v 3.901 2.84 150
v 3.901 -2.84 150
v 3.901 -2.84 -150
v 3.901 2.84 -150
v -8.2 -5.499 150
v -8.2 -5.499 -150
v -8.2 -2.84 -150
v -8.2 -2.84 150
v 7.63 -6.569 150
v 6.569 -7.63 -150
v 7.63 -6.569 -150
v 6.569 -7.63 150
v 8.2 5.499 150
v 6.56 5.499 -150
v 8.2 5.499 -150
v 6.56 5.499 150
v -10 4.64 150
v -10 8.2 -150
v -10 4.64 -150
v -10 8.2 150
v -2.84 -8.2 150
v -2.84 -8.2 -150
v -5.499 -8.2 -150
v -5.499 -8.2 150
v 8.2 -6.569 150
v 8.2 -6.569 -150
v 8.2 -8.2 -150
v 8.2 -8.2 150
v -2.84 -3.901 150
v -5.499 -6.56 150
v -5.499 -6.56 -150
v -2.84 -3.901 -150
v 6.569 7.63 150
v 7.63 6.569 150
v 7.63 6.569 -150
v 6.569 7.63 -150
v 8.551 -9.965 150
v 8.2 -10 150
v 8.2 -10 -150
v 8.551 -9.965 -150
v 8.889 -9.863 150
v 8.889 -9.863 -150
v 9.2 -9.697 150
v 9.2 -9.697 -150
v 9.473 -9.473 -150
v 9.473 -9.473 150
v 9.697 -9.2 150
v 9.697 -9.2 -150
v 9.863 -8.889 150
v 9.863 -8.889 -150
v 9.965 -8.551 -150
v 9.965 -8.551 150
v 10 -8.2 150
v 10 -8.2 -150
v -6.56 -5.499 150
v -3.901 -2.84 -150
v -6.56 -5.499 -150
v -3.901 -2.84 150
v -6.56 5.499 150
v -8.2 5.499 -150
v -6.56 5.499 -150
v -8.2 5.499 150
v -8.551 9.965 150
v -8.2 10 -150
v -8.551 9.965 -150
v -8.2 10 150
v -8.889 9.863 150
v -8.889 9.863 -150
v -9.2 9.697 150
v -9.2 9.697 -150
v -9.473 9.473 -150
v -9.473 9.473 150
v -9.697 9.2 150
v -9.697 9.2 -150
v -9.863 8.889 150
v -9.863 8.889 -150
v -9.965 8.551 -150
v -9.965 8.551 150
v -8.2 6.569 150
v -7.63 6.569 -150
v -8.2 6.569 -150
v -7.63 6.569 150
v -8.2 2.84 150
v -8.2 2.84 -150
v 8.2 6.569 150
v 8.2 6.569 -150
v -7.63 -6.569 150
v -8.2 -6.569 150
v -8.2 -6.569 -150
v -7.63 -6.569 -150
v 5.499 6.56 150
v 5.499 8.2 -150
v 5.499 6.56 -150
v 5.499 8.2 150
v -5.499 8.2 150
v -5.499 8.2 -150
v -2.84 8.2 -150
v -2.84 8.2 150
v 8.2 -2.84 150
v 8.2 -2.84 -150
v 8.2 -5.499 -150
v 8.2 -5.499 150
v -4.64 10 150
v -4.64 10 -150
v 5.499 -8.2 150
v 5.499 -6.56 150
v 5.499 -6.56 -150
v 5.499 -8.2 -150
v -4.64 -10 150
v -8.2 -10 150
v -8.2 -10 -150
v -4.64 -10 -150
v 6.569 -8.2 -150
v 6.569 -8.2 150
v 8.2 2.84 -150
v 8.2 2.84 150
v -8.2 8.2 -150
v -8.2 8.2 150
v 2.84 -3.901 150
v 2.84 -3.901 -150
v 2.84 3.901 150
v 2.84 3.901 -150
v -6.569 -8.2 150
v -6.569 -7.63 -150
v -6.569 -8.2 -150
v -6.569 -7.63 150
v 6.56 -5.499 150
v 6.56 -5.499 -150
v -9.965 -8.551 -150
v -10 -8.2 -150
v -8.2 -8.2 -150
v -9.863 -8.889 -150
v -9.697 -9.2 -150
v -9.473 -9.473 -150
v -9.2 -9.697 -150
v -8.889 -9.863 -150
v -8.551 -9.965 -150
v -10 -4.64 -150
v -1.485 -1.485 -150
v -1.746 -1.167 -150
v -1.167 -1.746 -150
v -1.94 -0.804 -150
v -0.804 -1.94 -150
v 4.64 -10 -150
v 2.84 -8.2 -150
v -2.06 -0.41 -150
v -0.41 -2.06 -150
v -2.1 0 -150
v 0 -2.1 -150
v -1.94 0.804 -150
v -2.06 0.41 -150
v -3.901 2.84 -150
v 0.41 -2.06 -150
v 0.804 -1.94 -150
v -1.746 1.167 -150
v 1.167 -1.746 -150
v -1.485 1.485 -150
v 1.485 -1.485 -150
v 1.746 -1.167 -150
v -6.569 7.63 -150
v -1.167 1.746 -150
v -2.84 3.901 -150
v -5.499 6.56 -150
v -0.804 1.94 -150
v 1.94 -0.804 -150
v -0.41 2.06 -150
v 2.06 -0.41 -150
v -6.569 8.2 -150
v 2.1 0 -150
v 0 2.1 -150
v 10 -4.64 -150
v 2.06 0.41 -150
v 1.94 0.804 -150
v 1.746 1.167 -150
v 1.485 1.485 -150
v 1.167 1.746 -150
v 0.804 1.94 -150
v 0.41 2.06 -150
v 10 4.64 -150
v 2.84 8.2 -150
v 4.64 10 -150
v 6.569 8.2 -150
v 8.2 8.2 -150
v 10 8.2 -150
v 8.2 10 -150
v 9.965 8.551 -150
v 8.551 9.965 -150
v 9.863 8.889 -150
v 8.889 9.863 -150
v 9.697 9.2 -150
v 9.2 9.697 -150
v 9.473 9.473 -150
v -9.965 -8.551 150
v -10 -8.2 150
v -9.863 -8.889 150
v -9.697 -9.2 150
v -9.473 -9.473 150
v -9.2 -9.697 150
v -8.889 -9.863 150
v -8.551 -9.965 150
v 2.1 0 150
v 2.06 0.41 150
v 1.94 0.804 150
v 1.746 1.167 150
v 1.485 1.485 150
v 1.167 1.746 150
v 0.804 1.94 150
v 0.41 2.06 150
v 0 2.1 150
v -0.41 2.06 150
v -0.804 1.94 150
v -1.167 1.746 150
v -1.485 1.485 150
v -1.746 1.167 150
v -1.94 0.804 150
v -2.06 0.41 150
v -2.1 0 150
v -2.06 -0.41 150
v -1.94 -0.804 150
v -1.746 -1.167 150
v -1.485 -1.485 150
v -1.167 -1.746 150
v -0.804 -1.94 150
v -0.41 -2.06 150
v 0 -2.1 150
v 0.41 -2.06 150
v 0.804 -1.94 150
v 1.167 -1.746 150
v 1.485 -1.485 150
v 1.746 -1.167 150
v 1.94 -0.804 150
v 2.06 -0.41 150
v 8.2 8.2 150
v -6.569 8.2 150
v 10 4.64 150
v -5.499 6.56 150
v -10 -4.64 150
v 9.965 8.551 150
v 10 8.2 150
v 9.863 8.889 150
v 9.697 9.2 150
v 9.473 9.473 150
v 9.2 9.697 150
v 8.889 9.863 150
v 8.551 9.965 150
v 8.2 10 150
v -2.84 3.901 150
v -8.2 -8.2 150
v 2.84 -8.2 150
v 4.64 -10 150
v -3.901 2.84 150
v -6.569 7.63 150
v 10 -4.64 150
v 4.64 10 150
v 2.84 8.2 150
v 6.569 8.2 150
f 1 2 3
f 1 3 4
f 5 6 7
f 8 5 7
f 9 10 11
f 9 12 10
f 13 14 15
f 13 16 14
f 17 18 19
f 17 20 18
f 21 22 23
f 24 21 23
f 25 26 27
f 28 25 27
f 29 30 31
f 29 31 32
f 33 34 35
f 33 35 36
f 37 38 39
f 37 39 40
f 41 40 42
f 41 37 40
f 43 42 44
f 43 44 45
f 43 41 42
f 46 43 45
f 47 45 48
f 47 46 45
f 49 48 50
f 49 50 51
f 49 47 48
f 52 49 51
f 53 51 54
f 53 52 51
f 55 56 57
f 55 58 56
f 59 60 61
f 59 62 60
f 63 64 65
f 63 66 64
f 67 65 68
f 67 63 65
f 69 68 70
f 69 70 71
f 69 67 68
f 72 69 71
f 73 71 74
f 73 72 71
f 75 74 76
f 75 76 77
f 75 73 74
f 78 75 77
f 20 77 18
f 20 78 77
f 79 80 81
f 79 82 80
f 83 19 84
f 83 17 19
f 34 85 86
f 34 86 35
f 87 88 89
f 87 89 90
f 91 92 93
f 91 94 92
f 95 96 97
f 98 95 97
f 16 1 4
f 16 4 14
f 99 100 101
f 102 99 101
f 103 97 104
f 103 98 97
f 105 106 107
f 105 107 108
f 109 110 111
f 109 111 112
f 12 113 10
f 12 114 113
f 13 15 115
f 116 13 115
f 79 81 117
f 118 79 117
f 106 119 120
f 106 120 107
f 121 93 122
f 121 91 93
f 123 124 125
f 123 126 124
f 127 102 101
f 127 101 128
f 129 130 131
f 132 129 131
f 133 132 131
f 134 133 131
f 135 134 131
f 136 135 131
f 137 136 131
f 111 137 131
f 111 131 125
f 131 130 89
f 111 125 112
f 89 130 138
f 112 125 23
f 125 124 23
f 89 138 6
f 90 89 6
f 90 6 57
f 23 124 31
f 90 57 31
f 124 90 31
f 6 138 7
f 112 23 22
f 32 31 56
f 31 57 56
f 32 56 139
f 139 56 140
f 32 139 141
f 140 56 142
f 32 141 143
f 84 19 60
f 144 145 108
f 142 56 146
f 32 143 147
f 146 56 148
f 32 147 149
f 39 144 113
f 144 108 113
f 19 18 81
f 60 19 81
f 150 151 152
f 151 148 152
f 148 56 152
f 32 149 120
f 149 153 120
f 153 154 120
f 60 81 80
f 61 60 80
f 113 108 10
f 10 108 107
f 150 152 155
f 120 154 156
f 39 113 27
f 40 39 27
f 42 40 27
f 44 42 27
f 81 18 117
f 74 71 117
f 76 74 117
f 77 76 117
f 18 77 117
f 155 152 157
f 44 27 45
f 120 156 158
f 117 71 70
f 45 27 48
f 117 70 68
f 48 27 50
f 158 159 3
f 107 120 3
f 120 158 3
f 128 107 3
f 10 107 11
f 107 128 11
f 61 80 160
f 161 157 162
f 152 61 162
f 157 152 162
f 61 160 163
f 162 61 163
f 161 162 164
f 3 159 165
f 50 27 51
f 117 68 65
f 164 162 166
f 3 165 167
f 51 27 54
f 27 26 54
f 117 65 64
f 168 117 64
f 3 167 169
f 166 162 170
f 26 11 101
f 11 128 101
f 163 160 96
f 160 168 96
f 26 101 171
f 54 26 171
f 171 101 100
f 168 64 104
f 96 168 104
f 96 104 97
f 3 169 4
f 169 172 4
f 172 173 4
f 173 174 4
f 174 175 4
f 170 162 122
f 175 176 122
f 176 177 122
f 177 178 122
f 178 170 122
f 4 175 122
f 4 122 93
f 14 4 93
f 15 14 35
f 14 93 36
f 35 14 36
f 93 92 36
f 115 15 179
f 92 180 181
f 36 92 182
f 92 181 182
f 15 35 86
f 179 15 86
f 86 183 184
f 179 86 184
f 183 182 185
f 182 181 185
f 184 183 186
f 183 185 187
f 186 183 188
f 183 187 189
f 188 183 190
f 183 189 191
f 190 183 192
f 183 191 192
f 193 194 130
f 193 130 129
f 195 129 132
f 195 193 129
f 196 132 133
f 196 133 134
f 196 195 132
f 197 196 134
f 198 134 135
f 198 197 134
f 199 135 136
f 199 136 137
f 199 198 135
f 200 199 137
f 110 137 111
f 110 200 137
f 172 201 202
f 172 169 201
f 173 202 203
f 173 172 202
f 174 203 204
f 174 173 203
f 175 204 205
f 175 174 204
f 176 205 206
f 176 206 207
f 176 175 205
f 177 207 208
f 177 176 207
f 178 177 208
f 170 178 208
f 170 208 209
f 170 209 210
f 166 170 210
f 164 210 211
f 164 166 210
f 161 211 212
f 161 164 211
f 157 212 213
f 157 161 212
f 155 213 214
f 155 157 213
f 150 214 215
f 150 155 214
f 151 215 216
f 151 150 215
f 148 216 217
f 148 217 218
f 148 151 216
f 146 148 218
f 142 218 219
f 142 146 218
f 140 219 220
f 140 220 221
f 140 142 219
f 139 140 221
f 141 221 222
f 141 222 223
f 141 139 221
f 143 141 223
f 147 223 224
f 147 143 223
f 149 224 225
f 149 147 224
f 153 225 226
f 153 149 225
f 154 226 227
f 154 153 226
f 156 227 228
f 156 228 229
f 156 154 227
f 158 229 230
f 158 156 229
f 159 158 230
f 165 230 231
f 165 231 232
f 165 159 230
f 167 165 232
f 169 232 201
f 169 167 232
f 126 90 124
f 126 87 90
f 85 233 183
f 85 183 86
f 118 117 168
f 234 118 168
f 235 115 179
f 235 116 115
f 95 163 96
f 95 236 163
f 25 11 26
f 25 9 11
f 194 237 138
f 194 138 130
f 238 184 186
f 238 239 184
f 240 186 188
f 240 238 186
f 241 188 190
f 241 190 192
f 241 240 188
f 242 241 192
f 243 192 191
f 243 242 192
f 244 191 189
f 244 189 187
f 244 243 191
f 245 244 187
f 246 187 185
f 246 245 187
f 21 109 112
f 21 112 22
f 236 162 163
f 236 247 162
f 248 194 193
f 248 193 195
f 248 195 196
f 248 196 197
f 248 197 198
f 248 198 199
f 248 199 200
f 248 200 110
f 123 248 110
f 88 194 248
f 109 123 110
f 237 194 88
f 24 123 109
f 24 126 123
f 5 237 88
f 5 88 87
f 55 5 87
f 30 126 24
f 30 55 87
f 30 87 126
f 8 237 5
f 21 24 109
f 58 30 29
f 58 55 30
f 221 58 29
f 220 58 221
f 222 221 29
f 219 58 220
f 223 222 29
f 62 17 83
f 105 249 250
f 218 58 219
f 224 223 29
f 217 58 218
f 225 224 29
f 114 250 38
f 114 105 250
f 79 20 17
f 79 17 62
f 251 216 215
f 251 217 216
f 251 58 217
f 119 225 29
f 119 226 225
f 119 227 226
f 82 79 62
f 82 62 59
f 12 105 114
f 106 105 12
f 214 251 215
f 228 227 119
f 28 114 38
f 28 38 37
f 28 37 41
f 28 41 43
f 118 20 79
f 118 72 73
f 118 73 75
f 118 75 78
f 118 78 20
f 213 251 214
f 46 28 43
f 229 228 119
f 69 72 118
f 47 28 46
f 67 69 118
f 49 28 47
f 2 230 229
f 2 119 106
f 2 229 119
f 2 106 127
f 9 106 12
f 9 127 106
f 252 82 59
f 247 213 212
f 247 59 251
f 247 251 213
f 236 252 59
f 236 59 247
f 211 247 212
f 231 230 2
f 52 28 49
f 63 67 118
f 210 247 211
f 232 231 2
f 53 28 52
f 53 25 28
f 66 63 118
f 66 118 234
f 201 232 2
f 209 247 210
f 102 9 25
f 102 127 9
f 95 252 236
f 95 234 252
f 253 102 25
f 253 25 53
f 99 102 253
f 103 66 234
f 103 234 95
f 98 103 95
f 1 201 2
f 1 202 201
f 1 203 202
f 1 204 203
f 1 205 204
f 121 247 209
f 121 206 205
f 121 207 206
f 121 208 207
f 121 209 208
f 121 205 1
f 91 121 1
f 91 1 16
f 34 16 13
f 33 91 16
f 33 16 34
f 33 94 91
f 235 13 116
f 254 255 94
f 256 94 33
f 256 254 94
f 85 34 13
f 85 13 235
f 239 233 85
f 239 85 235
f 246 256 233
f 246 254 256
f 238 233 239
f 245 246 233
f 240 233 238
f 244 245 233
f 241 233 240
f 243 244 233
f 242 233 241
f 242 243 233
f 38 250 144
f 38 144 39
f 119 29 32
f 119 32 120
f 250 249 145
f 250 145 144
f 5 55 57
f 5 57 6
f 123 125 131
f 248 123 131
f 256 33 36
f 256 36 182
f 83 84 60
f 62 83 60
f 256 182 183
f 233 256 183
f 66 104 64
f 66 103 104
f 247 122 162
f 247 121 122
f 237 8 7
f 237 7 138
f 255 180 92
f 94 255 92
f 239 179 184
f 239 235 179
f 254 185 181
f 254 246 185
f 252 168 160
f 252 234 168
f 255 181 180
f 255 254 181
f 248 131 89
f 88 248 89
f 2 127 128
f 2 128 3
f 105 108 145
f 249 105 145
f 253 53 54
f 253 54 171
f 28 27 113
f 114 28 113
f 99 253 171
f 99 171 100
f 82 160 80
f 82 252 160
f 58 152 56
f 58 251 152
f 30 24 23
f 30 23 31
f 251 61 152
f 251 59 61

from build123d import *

# Parameters (mm, degrees)
ESQUISSE1_R        = 2.1
BOSS_EXTRU_2_DEPTH = 150


with BuildPart() as part:
    # Esquisse1 → Boss.-Extru.2 (new, symmetric)
    with BuildSketch(Plane.XY):
        with BuildLine():
            Line((-3.900660172, 0), (-3.900660172, -2.84))
            Line((-3.900660172, -2.84), (-6.56, -5.499339828))
            Line((-6.56, -5.499339828), (-8.2, -5.499339828))
            Line((-8.2, -5.499339828), (-8.2, -2.84))
            Line((-8.2, -2.84), (-10, -4.64))
            Line((-10, -4.64), (-10, -8.2))
            ThreePointArc((-10, -8.2), (-9.472792206, -9.472792206), (-8.2, -10))
            Line((-8.2, -10), (-4.64, -10))
            Line((-4.64, -10), (-2.84, -8.2))
            Line((-2.84, -8.2), (-5.499339828, -8.2))
            Line((-5.499339828, -8.2), (-5.499339828, -6.56))
            Line((-5.499339828, -6.56), (-2.84, -3.900660172))
            Line((-2.84, -3.900660172), (0, -3.900660172))
            Line((0, -3.900660172), (2.84, -3.900660172))
            Line((2.84, -3.900660172), (5.499339828, -6.56))
            Line((5.499339828, -6.56), (5.499339828, -8.2))
            Line((5.499339828, -8.2), (2.84, -8.2))
            Line((2.84, -8.2), (4.64, -10))
            Line((4.64, -10), (8.2, -10))
            ThreePointArc((8.2, -10), (9.472792206, -9.472792206), (10, -8.2))
            Line((10, -8.2), (10, -4.64))
            Line((10, -4.64), (8.2, -2.84))
            Line((8.2, -2.84), (8.2, -5.499339828))
            Line((8.2, -5.499339828), (6.56, -5.499339828))
            Line((6.56, -5.499339828), (3.900660172, -2.84))
            Line((3.900660172, -2.84), (3.900660172, 0))
            Line((3.900660172, 0), (3.900660172, 2.84))
            Line((3.900660172, 2.84), (6.56, 5.499339828))
            Line((6.56, 5.499339828), (8.2, 5.499339828))
            Line((8.2, 5.499339828), (8.2, 2.84))
            Line((8.2, 2.84), (10, 4.64))
            Line((10, 4.64), (10, 8.2))
            ThreePointArc((10, 8.2), (9.472792206, 9.472792206), (8.2, 10))
            Line((8.2, 10), (4.64, 10))
            Line((4.64, 10), (2.84, 8.2))
            Line((2.84, 8.2), (5.499339828, 8.2))
            Line((5.499339828, 8.2), (5.499339828, 6.56))
            Line((5.499339828, 6.56), (2.84, 3.900660172))
            Line((2.84, 3.900660172), (0, 3.900660172))
            Line((0, 3.900660172), (-2.84, 3.900660172))
            Line((-2.84, 3.900660172), (-5.499339828, 6.56))
            Line((-5.499339828, 6.56), (-5.499339828, 8.2))
            Line((-5.499339828, 8.2), (-2.84, 8.2))
            Line((-2.84, 8.2), (-4.64, 10))
            Line((-4.64, 10), (-8.2, 10))
            ThreePointArc((-8.2, 10), (-9.472792206, 9.472792206), (-10, 8.2))
            Line((-10, 8.2), (-10, 4.64))
            Line((-10, 4.64), (-8.2, 2.84))
            Line((-8.2, 2.84), (-8.2, 5.499339828))
            Line((-8.2, 5.499339828), (-6.56, 5.499339828))
            Line((-6.56, 5.499339828), (-3.900660172, 2.84))
            Line((-3.900660172, 2.84), (-3.900660172, 0))
        make_face()
        Circle(ESQUISSE1_R, mode=Mode.SUBTRACT)
        Polygon((-8.2, -8.2), (-8.2, -6.569339828), (-7.63, -6.569339828), (-6.569339828, -7.63), (-6.569339828, -8.2), align=None, mode=Mode.SUBTRACT)
        Polygon((-8.2, 6.569339828), (-8.2, 8.2), (-6.569339828, 8.2), (-6.569339828, 7.63), (-7.63, 6.569339828), align=None, mode=Mode.SUBTRACT)
        Polygon((6.569339828, 8.2), (8.2, 8.2), (8.2, 6.569339828), (7.63, 6.569339828), (6.569339828, 7.63), align=None, mode=Mode.SUBTRACT)
        Polygon((8.2, -6.569339828), (8.2, -8.2), (6.569339828, -8.2), (6.569339828, -7.63), (7.63, -6.569339828), align=None, mode=Mode.SUBTRACT)
    extrude(amount=BOSS_EXTRU_2_DEPTH, both=True)


solid = part.part
